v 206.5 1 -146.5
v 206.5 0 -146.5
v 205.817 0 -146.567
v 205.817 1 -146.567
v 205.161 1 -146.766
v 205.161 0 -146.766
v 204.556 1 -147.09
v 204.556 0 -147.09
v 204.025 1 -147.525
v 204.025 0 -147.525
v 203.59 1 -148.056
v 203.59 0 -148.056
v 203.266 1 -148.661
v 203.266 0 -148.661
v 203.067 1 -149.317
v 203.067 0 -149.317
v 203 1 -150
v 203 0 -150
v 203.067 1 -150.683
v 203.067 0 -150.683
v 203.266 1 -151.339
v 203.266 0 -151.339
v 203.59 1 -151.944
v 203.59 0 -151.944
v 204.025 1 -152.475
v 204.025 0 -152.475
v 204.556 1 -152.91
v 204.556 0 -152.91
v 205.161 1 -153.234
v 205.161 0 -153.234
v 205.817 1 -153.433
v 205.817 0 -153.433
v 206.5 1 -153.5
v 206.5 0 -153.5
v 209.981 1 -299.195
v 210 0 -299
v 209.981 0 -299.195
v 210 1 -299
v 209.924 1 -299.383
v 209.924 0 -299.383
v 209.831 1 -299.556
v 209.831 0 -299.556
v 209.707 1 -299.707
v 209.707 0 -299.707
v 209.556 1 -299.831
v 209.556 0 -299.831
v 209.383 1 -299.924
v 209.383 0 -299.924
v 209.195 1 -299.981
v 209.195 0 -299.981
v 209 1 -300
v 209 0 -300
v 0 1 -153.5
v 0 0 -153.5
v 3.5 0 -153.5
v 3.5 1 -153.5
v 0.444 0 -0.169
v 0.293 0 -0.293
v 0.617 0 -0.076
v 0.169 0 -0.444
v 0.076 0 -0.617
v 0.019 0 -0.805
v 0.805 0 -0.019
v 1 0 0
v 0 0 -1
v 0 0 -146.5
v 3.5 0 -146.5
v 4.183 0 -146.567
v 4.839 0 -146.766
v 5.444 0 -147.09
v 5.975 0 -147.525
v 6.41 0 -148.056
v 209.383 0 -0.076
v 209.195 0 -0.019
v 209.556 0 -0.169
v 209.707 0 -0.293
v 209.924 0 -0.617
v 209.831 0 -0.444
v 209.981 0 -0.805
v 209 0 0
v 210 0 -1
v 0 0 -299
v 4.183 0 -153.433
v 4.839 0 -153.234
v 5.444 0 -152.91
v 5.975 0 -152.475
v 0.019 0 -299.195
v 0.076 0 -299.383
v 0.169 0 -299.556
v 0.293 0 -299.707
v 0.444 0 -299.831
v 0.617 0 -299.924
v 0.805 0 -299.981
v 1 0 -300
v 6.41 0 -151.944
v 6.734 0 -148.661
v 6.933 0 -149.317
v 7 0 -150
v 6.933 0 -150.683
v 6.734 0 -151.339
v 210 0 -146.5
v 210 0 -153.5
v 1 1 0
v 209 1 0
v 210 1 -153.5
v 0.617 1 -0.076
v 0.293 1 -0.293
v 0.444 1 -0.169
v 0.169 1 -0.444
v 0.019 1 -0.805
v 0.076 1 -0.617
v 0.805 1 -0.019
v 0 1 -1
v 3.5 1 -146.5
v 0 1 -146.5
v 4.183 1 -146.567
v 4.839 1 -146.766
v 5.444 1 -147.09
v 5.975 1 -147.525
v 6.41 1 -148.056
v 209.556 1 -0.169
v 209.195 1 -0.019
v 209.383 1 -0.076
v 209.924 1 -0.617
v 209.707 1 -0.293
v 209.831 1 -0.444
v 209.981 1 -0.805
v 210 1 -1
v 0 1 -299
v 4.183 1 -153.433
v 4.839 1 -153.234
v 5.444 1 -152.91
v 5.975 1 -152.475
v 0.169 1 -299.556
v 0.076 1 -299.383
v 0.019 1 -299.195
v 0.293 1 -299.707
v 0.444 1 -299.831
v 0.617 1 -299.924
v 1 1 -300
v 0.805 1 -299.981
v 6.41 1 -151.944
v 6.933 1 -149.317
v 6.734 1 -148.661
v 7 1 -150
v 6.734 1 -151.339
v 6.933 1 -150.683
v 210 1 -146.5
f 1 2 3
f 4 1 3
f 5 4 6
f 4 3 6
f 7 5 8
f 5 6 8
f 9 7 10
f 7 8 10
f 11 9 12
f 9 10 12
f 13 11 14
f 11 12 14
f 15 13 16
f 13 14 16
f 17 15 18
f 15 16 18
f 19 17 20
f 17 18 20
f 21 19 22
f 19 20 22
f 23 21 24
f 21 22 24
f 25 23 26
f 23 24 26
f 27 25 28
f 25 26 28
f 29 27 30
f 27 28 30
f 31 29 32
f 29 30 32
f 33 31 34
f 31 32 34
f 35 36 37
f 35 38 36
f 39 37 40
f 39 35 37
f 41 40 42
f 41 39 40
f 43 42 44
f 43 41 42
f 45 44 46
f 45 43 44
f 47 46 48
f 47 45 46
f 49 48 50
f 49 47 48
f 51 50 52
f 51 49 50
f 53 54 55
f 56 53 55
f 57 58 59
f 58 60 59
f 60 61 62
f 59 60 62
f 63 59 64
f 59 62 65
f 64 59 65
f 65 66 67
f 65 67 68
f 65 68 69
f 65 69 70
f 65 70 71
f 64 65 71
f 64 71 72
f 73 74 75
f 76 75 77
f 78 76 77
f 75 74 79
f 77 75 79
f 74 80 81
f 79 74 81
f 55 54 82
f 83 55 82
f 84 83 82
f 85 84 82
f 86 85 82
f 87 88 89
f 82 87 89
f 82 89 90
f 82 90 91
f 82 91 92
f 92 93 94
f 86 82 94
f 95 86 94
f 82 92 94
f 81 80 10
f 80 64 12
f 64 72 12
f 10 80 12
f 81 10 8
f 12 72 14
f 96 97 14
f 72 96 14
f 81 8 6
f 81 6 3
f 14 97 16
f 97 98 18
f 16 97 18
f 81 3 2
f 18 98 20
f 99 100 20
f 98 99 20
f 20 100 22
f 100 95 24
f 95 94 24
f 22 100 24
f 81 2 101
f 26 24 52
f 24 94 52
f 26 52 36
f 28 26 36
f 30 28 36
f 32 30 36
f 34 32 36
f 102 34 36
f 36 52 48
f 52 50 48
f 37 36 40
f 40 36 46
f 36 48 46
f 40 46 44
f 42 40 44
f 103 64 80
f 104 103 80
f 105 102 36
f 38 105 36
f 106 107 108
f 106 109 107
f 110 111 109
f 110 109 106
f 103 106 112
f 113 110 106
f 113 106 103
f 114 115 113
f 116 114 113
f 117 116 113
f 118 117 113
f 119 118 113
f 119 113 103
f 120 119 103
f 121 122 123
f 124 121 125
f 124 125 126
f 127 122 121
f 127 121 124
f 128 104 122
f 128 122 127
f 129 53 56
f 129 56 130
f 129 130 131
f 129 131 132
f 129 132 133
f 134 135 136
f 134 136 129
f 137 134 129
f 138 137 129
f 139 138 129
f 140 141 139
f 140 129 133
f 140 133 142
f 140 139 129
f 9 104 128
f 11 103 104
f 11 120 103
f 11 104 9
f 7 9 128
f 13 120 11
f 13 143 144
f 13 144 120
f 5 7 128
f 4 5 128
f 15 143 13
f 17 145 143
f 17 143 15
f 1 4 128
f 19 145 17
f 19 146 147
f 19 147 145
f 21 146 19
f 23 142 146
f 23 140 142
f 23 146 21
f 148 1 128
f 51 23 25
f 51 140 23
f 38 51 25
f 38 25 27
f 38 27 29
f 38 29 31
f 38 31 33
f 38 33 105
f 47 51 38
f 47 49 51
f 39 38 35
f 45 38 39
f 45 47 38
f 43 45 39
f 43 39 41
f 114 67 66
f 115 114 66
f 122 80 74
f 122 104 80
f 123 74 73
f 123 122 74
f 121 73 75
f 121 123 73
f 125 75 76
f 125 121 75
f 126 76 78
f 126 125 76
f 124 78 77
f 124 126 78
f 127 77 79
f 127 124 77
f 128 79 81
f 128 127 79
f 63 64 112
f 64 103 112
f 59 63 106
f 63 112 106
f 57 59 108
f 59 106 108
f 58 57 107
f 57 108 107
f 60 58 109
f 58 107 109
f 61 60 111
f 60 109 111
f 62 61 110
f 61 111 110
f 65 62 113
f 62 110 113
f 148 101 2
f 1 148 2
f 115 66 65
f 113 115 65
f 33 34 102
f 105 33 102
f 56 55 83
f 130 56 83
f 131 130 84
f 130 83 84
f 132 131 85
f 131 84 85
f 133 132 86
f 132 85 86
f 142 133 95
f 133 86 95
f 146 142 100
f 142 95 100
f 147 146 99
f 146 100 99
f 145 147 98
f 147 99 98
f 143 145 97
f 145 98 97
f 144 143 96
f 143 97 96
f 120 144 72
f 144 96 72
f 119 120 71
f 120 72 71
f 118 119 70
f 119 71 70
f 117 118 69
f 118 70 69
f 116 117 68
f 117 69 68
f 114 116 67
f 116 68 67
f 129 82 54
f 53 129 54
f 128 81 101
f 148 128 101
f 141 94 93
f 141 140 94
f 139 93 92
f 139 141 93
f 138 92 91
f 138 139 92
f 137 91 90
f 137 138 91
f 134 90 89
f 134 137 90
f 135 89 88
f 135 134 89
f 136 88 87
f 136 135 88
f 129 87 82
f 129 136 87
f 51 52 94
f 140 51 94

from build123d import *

# Parameters (mm, degrees)
SALIENTE_EXTRUIR1_DEPTH = 1
REDONDEO1_R             = 1


with BuildPart() as part:
    # Croquis1 → Saliente-Extruir1 (new body)
    with BuildSketch(Plane(origin=(0, 0, 0), x_dir=(1, 0, 0), z_dir=(0, 1, 0))):
        with BuildLine():
            Line((0, 0), (210, 0))
            Line((210, 0), (210, 146.5))
            Line((210, 146.5), (206.5, 146.5))
            ThreePointArc((206.5, 146.5), (203, 150), (206.5, 153.5))
            Line((206.5, 153.5), (210, 153.5))
            Line((210, 153.5), (210, 300))
            Line((210, 300), (0, 300))
            Line((0, 300), (0, 153.5))
            Line((0, 153.5), (3.5, 153.5))
            ThreePointArc((3.5, 153.5), (7, 150), (3.5, 146.5))
            Line((3.5, 146.5), (0, 146.5))
            Line((0, 146.5), (0, 0))
        make_face()
    extrude(amount=SALIENTE_EXTRUIR1_DEPTH)

    # Redondeo1
    redondeo1_edges = [part.edges().sort_by_distance(p)[0] for p in [
        (0, 0.5, -300),
        (210, 0.5, -300),
        (210, 0.5, 0),
        (0, 0.5, 0),
    ]]
    fillet(redondeo1_edges, radius=REDONDEO1_R)


solid = part.part
